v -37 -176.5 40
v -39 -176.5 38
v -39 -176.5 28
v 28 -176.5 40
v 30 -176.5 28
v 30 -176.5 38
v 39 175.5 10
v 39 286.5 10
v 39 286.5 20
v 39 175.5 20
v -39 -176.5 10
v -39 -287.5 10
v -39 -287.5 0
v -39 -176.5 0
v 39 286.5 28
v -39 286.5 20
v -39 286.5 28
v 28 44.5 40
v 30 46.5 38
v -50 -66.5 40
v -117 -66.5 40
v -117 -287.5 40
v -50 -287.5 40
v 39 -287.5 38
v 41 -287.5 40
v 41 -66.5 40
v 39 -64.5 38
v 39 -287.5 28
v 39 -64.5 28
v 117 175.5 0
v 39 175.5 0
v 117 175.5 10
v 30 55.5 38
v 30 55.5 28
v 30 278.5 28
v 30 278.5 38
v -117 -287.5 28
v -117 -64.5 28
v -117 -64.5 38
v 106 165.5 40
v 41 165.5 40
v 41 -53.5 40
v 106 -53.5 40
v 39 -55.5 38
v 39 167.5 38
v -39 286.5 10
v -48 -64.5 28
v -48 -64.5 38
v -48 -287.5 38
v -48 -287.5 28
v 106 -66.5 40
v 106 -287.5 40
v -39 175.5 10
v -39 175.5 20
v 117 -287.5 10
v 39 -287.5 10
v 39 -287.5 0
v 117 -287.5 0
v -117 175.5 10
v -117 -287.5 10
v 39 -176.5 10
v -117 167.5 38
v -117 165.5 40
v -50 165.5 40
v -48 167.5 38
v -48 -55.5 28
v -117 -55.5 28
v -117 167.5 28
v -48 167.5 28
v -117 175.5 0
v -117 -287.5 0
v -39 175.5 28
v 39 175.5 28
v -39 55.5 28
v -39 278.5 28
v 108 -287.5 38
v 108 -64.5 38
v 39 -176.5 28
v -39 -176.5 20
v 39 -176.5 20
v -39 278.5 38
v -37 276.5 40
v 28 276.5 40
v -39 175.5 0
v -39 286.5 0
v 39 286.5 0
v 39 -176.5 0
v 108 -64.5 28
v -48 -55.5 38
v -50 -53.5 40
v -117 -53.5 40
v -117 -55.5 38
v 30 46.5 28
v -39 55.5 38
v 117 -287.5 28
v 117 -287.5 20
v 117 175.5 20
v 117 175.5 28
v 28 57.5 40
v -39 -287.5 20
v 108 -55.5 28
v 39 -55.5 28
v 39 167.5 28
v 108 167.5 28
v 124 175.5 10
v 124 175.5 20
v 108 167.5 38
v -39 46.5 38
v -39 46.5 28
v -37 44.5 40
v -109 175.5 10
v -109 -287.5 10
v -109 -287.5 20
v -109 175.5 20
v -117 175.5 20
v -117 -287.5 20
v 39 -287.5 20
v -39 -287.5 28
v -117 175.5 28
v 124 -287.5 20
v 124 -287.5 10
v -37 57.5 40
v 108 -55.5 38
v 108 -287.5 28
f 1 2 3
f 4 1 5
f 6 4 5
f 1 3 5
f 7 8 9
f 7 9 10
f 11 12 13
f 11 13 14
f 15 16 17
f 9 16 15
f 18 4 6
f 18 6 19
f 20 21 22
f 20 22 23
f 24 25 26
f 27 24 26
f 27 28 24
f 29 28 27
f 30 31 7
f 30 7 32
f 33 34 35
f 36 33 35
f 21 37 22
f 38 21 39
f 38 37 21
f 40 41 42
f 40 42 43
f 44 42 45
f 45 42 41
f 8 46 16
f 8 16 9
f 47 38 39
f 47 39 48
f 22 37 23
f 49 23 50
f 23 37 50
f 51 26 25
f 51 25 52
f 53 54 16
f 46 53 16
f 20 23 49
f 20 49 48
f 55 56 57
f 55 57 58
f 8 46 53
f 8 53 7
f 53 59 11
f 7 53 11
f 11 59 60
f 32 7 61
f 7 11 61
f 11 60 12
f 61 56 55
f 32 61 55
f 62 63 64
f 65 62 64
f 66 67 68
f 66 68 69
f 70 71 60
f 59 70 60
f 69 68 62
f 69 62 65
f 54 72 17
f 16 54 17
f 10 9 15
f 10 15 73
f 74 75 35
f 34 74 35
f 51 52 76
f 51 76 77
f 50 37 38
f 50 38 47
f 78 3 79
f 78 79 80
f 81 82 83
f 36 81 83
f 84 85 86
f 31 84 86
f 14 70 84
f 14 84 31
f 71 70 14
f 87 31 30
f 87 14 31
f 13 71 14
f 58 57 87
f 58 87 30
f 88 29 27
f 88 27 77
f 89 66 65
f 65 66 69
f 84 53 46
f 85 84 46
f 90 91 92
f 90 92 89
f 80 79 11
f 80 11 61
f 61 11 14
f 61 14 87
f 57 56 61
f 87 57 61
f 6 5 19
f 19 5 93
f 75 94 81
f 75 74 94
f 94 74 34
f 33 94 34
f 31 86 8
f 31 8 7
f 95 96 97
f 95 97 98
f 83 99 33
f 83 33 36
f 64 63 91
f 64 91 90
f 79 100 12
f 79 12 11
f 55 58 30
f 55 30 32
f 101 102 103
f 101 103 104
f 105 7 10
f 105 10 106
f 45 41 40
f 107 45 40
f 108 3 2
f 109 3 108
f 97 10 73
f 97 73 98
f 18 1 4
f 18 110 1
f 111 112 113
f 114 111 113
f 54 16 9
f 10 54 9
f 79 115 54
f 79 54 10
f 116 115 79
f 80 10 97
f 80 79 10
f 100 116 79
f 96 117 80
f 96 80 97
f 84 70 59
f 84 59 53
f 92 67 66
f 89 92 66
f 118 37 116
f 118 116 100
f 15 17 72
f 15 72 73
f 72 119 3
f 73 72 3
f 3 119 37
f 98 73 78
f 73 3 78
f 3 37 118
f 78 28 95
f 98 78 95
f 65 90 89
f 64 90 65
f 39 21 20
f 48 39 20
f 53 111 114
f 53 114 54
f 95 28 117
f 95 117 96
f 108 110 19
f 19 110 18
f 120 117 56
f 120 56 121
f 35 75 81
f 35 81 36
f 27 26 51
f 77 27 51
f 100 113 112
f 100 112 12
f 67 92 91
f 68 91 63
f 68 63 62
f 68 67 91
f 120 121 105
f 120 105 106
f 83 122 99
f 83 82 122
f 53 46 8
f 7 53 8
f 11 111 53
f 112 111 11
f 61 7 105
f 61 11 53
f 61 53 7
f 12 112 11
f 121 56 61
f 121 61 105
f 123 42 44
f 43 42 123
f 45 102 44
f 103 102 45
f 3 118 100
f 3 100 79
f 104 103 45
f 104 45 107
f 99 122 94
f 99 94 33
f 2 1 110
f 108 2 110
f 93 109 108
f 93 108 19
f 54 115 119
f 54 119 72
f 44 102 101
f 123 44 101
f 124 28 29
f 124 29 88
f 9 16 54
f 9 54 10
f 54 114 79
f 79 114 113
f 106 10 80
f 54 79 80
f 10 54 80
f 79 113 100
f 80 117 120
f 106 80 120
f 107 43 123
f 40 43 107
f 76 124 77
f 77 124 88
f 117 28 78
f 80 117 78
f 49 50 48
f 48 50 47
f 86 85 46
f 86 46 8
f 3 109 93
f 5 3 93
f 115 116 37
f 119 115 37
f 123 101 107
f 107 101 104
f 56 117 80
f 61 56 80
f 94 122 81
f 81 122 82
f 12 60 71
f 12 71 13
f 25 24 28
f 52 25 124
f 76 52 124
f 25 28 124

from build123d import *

# Parameters (mm, degrees)
F0_W          = 234
F0_H          = 10
F1_DEPTH      = 287.5
F1_DEPTH_BACK = 287.5
F2_W          = 233
F2_H          = 10
F3_DEPTH      = 575
F4_W          = 234
F4_H          = 8
F5_DEPTH      = 575
F6_W          = 78
F6_H          = 111
F6_W_2        = 85
F7_DEPTH      = 28.001
F8_W          = 69
F8_H          = 223
F9_DEPTH      = 12
F10_SIZE      = 2
F11_SIZE      = 2
F12_W         = 78
F12_H         = 1
F12_W_2       = 85
F13_DEPTH     = 40.001


with BuildPart() as f1:
    # F0 (on Front) → F1 (new body, two sides)
    with BuildSketch(Plane.XZ) as f1_sk:
        with Locations((0, 5)):
            Rectangle(F0_W, F0_H)
    extrude(amount=F1_DEPTH)
    extrude(f1_sk.sketch, amount=-F1_DEPTH_BACK)


with BuildPart() as f3:
    # F2 (on face) → F3 (new body, through all)
    with BuildSketch(Plane.XZ.offset(287.5)):
        with Locations((7.5, 15)):
            Rectangle(F2_W, F2_H)
    extrude(amount=-F3_DEPTH)


with BuildPart() as f5:
    # F4 (on face) → F5 (new body, through all)
    with BuildSketch(Plane.XZ.offset(287.5)):
        with Locations((0, 24)):
            Rectangle(F4_W, F4_H)
    extrude(amount=-F5_DEPTH)


with BuildPart() as f7_tool:
    # F6 (on face) → F7 (new body, through all)
    with BuildSketch(Plane.XY.offset(28)):
        with Locations((0, -232)):
            Rectangle(F6_W, F6_H)
        with Locations((-78, 232)):
            Rectangle(F6_W, F6_H)
        with Locations((81.5, 232)):
            Rectangle(F6_W_2, F6_H)
    extrude(amount=-F7_DEPTH)


with BuildPart() as f1_1:
    add(f1.part)

    # F7: cut by f7_tool
    add(f7_tool.part, mode=Mode.SUBTRACT)


with BuildPart() as f3_1:
    add(f3.part)

    # F7: cut by f7_tool
    add(f7_tool.part, mode=Mode.SUBTRACT)


with BuildPart() as f5_1:
    add(f5.part)

    # F7: cut by f7_tool
    add(f7_tool.part, mode=Mode.SUBTRACT)


with BuildPart() as f9:
    # F8 (on face) → F9 (new body)
    with BuildSketch(Plane.XY.offset(28)):
        with Locations((-82.5, -176)):
            Rectangle(F8_W, F8_H)
        with Locations((-82.5, 56)):
            Rectangle(F8_W, F8_H)
        with Locations((73.5, -176)):
            Rectangle(F8_W, F8_H)
        with Locations((73.5, 56)):
            Rectangle(F8_W, F8_H)
        with Locations((-4.5, -65)):
            Rectangle(F8_W, F8_H)
        with Locations((-4.5, 167)):
            Rectangle(F8_W, F8_H)
    extrude(amount=F9_DEPTH)

    # F10
    f10_edges = [f9.edges().sort_by_distance(p)[0] for p in [
        (-4.5, 278.5, 40),
        (30, 167, 40),
        (-48, 56, 40),
        (-82.5, 167.5, 40),
        (-82.5, -55.5, 40),
        (-82.5, -64.5, 40),
        (-48, -176, 40),
        (-4.5, 55.5, 40),
        (-4.5, 46.5, 40),
        (-39, -65, 40),
        (30, -65, 40),
        (39, 56, 40),
        (73.5, -55.5, 40),
        (108, 56, 40),
        (73.5, 167.5, 40),
        (73.5, -64.5, 40),
        (108, -176, 40),
    ]]
    chamfer(f10_edges, length=F10_SIZE)

    # F11
    f11_edges = [f9.edges().sort_by_distance(p)[0] for p in [
        (-39, 167, 40),
        (39, -177, 40),
    ]]
    chamfer(f11_edges, length=F11_SIZE)


with BuildPart() as f13_tool:
    # F12 (on face) → F13 (new body, through all)
    with BuildSketch(Plane(origin=(0, 0, 0), x_dir=(1, 0, 0), z_dir=(0, 0, -1))):
        with Locations((-78, -176)):
            Rectangle(F12_W, F12_H)
        with Locations((0, -287)):
            Rectangle(F12_W, F12_H)
        with Locations((81.5, -176)):
            Rectangle(F12_W_2, F12_H)
    extrude(amount=-F13_DEPTH)


with BuildPart() as f1_2:
    add(f1_1.part)

    # F13: cut by f13_tool
    add(f13_tool.part, mode=Mode.SUBTRACT)


with BuildPart() as f3_2:
    add(f3_1.part)

    # F13: cut by f13_tool
    add(f13_tool.part, mode=Mode.SUBTRACT)


with BuildPart() as f5_2:
    add(f5_1.part)

    # F13: cut by f13_tool
    add(f13_tool.part, mode=Mode.SUBTRACT)


solid = Compound([f9.part, f1_2.part, f3_2.part, f5_2.part])
